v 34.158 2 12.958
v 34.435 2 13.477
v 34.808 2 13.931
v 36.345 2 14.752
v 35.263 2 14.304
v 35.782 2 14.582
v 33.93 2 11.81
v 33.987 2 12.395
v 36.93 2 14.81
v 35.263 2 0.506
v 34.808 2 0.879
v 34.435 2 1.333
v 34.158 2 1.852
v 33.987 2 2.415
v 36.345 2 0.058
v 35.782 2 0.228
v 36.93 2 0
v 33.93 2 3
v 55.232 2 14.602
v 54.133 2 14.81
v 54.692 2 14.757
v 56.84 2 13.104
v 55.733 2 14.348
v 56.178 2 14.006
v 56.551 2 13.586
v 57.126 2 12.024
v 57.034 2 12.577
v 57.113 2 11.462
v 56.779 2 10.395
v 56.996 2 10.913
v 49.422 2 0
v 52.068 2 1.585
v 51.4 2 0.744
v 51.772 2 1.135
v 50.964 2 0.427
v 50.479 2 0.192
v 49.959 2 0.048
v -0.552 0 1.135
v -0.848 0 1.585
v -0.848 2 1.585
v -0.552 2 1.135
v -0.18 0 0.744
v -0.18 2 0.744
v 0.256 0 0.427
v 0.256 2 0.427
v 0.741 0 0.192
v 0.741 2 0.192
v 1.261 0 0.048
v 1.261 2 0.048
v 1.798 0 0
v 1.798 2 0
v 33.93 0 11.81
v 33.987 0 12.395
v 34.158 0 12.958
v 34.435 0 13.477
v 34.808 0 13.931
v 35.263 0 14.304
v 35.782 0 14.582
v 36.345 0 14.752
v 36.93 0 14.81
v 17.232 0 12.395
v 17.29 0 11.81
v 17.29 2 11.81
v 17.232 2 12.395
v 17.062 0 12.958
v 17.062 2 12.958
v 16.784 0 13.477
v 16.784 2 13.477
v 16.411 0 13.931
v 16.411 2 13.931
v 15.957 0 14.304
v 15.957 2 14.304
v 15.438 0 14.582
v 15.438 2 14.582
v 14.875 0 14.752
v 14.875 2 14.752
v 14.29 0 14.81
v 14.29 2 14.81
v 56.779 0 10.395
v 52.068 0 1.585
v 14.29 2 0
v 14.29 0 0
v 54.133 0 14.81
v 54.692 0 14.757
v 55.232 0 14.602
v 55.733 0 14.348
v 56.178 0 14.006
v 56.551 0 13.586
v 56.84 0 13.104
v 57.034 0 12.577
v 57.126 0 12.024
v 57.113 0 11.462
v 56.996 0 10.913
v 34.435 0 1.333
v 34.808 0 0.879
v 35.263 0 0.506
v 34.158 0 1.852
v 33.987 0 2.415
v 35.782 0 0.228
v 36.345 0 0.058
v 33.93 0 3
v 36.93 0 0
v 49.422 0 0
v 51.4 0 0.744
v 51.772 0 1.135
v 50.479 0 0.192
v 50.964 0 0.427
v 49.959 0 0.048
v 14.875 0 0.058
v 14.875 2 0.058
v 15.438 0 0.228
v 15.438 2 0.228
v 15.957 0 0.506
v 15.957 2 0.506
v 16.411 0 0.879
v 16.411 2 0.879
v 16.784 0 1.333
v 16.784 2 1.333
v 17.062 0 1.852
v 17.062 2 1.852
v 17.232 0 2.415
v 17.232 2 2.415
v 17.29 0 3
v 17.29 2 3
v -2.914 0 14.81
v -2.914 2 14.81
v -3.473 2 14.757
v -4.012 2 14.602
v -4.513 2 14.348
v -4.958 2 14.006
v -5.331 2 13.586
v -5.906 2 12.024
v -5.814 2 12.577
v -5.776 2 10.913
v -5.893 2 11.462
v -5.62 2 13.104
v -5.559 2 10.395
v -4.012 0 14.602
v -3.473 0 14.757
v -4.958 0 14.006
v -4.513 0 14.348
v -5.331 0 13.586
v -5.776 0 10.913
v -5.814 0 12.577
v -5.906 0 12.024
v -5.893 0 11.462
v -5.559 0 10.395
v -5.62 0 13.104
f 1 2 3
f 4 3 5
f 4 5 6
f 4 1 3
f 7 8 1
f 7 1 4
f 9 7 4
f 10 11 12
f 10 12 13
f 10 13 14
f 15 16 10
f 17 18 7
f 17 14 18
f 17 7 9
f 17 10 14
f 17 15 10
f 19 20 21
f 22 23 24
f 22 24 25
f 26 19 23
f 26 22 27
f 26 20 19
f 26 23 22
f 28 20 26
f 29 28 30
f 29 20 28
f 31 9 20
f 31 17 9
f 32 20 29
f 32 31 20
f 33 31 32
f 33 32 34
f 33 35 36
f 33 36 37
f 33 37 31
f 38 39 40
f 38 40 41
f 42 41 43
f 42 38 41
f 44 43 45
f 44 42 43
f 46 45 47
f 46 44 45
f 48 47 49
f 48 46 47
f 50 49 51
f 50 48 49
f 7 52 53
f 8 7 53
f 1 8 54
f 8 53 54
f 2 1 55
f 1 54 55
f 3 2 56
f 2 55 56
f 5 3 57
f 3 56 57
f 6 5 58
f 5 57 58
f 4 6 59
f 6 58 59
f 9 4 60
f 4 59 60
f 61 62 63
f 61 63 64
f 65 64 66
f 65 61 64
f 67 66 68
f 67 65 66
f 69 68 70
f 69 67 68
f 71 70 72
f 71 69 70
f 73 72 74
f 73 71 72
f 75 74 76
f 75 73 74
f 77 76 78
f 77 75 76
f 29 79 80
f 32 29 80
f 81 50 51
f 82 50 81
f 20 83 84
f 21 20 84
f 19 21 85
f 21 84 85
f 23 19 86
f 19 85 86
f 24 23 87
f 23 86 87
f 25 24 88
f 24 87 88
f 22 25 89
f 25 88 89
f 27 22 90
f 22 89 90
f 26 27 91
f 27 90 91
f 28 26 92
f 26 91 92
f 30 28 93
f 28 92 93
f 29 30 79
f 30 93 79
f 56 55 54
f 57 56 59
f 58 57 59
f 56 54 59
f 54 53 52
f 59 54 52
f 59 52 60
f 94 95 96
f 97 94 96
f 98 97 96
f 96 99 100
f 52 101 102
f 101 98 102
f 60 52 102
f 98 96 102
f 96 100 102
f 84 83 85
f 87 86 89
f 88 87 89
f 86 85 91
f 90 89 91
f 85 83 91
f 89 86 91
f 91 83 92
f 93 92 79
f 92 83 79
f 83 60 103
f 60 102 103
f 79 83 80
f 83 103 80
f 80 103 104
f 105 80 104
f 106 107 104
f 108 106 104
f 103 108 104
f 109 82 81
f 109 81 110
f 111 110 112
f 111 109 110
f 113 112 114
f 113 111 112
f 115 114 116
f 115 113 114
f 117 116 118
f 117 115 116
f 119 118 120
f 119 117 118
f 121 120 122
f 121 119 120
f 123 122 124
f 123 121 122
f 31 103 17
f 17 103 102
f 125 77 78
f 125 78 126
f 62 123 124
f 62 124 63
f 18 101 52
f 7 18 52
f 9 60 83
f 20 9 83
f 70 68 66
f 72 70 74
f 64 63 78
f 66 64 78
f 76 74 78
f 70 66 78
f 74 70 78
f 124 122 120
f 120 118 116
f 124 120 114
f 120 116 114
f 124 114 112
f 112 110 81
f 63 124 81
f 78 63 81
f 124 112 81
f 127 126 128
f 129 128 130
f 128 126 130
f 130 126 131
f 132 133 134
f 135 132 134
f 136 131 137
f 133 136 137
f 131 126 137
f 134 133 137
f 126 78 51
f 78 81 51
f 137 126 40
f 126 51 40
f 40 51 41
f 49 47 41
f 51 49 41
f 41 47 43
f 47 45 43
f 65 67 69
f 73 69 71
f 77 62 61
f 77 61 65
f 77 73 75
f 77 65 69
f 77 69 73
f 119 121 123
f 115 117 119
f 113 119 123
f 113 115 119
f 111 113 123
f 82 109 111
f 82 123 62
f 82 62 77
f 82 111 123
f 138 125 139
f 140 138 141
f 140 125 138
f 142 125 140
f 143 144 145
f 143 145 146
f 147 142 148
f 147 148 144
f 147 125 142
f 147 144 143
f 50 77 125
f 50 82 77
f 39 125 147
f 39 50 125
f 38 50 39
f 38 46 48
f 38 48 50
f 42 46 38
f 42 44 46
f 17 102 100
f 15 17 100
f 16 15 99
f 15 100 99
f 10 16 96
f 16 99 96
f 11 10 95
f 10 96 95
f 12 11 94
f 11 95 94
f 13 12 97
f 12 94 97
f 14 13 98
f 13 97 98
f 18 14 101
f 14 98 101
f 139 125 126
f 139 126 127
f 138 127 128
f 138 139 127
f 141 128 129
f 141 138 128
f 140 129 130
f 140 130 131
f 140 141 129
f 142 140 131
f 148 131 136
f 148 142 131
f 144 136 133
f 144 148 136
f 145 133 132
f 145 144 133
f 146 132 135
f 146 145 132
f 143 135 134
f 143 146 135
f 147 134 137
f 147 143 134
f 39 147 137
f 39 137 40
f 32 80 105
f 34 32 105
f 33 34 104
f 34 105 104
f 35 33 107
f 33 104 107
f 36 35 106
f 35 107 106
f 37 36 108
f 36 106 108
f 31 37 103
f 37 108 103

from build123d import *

# Parameters (mm, degrees)
EXTRUDE_1_DEPTH   = 2
EXTRUDE_1_2_DEPTH = 2


with BuildPart() as part:
    # 草图1 → 凸台-拉伸1 (new body)
    with BuildSketch(Plane(origin=(0, 0, 0), x_dir=(1, 0, 0), z_dir=(0, 1, 0))):
        with BuildLine():
            Line((1.797714334, 0), (14.29, 0))
            ThreePointArc((14.29, 0), (16.411320344, -0.878679656), (17.29, -3))
            Line((17.29, -3), (17.29, -11.81))
            ThreePointArc((17.29, -11.81), (16.411320344, -13.931320344), (14.29, -14.81))
            Line((14.29, -14.81), (-2.913642857, -14.81))
            ThreePointArc((-2.913642857, -14.81), (-5.486986201, -13.352045406), (-5.559117711, -10.395269356))
            Line((-5.559117711, -10.395269356), (-0.84776052, -1.585269356))
            ThreePointArc((-0.84776052, -1.585269356), (0.255668929, -0.426656656), (1.797714334, 0))
        make_face()
    extrude(amount=EXTRUDE_1_DEPTH)


with BuildPart() as body_2:
    # 草图1 → Extrude 1 2 (new body)
    with BuildSketch(Plane(origin=(0, 0, 0), x_dir=(1, 0, 0), z_dir=(0, 1, 0))):
        with BuildLine():
            Line((33.929771652, -3), (33.929771652, -11.81))
            ThreePointArc((33.929771652, -11.81), (34.808451309, -13.931320344), (36.929771652, -14.81))
            Line((36.929771652, -14.81), (54.133414509, -14.81))
            ThreePointArc((54.133414509, -14.81), (56.706757853, -13.352045406), (56.778889363, -10.395269356))
            Line((56.778889363, -10.395269356), (52.067532172, -1.585269356))
            ThreePointArc((52.067532172, -1.585269356), (50.964102723, -0.426656656), (49.422057318, 0))
            Line((49.422057318, 0), (36.929771652, 0))
            ThreePointArc((36.929771652, 0), (34.808451309, -0.878679656), (33.929771652, -3))
        make_face()
    extrude(amount=EXTRUDE_1_2_DEPTH)


solid = Compound([part.part, body_2.part])
